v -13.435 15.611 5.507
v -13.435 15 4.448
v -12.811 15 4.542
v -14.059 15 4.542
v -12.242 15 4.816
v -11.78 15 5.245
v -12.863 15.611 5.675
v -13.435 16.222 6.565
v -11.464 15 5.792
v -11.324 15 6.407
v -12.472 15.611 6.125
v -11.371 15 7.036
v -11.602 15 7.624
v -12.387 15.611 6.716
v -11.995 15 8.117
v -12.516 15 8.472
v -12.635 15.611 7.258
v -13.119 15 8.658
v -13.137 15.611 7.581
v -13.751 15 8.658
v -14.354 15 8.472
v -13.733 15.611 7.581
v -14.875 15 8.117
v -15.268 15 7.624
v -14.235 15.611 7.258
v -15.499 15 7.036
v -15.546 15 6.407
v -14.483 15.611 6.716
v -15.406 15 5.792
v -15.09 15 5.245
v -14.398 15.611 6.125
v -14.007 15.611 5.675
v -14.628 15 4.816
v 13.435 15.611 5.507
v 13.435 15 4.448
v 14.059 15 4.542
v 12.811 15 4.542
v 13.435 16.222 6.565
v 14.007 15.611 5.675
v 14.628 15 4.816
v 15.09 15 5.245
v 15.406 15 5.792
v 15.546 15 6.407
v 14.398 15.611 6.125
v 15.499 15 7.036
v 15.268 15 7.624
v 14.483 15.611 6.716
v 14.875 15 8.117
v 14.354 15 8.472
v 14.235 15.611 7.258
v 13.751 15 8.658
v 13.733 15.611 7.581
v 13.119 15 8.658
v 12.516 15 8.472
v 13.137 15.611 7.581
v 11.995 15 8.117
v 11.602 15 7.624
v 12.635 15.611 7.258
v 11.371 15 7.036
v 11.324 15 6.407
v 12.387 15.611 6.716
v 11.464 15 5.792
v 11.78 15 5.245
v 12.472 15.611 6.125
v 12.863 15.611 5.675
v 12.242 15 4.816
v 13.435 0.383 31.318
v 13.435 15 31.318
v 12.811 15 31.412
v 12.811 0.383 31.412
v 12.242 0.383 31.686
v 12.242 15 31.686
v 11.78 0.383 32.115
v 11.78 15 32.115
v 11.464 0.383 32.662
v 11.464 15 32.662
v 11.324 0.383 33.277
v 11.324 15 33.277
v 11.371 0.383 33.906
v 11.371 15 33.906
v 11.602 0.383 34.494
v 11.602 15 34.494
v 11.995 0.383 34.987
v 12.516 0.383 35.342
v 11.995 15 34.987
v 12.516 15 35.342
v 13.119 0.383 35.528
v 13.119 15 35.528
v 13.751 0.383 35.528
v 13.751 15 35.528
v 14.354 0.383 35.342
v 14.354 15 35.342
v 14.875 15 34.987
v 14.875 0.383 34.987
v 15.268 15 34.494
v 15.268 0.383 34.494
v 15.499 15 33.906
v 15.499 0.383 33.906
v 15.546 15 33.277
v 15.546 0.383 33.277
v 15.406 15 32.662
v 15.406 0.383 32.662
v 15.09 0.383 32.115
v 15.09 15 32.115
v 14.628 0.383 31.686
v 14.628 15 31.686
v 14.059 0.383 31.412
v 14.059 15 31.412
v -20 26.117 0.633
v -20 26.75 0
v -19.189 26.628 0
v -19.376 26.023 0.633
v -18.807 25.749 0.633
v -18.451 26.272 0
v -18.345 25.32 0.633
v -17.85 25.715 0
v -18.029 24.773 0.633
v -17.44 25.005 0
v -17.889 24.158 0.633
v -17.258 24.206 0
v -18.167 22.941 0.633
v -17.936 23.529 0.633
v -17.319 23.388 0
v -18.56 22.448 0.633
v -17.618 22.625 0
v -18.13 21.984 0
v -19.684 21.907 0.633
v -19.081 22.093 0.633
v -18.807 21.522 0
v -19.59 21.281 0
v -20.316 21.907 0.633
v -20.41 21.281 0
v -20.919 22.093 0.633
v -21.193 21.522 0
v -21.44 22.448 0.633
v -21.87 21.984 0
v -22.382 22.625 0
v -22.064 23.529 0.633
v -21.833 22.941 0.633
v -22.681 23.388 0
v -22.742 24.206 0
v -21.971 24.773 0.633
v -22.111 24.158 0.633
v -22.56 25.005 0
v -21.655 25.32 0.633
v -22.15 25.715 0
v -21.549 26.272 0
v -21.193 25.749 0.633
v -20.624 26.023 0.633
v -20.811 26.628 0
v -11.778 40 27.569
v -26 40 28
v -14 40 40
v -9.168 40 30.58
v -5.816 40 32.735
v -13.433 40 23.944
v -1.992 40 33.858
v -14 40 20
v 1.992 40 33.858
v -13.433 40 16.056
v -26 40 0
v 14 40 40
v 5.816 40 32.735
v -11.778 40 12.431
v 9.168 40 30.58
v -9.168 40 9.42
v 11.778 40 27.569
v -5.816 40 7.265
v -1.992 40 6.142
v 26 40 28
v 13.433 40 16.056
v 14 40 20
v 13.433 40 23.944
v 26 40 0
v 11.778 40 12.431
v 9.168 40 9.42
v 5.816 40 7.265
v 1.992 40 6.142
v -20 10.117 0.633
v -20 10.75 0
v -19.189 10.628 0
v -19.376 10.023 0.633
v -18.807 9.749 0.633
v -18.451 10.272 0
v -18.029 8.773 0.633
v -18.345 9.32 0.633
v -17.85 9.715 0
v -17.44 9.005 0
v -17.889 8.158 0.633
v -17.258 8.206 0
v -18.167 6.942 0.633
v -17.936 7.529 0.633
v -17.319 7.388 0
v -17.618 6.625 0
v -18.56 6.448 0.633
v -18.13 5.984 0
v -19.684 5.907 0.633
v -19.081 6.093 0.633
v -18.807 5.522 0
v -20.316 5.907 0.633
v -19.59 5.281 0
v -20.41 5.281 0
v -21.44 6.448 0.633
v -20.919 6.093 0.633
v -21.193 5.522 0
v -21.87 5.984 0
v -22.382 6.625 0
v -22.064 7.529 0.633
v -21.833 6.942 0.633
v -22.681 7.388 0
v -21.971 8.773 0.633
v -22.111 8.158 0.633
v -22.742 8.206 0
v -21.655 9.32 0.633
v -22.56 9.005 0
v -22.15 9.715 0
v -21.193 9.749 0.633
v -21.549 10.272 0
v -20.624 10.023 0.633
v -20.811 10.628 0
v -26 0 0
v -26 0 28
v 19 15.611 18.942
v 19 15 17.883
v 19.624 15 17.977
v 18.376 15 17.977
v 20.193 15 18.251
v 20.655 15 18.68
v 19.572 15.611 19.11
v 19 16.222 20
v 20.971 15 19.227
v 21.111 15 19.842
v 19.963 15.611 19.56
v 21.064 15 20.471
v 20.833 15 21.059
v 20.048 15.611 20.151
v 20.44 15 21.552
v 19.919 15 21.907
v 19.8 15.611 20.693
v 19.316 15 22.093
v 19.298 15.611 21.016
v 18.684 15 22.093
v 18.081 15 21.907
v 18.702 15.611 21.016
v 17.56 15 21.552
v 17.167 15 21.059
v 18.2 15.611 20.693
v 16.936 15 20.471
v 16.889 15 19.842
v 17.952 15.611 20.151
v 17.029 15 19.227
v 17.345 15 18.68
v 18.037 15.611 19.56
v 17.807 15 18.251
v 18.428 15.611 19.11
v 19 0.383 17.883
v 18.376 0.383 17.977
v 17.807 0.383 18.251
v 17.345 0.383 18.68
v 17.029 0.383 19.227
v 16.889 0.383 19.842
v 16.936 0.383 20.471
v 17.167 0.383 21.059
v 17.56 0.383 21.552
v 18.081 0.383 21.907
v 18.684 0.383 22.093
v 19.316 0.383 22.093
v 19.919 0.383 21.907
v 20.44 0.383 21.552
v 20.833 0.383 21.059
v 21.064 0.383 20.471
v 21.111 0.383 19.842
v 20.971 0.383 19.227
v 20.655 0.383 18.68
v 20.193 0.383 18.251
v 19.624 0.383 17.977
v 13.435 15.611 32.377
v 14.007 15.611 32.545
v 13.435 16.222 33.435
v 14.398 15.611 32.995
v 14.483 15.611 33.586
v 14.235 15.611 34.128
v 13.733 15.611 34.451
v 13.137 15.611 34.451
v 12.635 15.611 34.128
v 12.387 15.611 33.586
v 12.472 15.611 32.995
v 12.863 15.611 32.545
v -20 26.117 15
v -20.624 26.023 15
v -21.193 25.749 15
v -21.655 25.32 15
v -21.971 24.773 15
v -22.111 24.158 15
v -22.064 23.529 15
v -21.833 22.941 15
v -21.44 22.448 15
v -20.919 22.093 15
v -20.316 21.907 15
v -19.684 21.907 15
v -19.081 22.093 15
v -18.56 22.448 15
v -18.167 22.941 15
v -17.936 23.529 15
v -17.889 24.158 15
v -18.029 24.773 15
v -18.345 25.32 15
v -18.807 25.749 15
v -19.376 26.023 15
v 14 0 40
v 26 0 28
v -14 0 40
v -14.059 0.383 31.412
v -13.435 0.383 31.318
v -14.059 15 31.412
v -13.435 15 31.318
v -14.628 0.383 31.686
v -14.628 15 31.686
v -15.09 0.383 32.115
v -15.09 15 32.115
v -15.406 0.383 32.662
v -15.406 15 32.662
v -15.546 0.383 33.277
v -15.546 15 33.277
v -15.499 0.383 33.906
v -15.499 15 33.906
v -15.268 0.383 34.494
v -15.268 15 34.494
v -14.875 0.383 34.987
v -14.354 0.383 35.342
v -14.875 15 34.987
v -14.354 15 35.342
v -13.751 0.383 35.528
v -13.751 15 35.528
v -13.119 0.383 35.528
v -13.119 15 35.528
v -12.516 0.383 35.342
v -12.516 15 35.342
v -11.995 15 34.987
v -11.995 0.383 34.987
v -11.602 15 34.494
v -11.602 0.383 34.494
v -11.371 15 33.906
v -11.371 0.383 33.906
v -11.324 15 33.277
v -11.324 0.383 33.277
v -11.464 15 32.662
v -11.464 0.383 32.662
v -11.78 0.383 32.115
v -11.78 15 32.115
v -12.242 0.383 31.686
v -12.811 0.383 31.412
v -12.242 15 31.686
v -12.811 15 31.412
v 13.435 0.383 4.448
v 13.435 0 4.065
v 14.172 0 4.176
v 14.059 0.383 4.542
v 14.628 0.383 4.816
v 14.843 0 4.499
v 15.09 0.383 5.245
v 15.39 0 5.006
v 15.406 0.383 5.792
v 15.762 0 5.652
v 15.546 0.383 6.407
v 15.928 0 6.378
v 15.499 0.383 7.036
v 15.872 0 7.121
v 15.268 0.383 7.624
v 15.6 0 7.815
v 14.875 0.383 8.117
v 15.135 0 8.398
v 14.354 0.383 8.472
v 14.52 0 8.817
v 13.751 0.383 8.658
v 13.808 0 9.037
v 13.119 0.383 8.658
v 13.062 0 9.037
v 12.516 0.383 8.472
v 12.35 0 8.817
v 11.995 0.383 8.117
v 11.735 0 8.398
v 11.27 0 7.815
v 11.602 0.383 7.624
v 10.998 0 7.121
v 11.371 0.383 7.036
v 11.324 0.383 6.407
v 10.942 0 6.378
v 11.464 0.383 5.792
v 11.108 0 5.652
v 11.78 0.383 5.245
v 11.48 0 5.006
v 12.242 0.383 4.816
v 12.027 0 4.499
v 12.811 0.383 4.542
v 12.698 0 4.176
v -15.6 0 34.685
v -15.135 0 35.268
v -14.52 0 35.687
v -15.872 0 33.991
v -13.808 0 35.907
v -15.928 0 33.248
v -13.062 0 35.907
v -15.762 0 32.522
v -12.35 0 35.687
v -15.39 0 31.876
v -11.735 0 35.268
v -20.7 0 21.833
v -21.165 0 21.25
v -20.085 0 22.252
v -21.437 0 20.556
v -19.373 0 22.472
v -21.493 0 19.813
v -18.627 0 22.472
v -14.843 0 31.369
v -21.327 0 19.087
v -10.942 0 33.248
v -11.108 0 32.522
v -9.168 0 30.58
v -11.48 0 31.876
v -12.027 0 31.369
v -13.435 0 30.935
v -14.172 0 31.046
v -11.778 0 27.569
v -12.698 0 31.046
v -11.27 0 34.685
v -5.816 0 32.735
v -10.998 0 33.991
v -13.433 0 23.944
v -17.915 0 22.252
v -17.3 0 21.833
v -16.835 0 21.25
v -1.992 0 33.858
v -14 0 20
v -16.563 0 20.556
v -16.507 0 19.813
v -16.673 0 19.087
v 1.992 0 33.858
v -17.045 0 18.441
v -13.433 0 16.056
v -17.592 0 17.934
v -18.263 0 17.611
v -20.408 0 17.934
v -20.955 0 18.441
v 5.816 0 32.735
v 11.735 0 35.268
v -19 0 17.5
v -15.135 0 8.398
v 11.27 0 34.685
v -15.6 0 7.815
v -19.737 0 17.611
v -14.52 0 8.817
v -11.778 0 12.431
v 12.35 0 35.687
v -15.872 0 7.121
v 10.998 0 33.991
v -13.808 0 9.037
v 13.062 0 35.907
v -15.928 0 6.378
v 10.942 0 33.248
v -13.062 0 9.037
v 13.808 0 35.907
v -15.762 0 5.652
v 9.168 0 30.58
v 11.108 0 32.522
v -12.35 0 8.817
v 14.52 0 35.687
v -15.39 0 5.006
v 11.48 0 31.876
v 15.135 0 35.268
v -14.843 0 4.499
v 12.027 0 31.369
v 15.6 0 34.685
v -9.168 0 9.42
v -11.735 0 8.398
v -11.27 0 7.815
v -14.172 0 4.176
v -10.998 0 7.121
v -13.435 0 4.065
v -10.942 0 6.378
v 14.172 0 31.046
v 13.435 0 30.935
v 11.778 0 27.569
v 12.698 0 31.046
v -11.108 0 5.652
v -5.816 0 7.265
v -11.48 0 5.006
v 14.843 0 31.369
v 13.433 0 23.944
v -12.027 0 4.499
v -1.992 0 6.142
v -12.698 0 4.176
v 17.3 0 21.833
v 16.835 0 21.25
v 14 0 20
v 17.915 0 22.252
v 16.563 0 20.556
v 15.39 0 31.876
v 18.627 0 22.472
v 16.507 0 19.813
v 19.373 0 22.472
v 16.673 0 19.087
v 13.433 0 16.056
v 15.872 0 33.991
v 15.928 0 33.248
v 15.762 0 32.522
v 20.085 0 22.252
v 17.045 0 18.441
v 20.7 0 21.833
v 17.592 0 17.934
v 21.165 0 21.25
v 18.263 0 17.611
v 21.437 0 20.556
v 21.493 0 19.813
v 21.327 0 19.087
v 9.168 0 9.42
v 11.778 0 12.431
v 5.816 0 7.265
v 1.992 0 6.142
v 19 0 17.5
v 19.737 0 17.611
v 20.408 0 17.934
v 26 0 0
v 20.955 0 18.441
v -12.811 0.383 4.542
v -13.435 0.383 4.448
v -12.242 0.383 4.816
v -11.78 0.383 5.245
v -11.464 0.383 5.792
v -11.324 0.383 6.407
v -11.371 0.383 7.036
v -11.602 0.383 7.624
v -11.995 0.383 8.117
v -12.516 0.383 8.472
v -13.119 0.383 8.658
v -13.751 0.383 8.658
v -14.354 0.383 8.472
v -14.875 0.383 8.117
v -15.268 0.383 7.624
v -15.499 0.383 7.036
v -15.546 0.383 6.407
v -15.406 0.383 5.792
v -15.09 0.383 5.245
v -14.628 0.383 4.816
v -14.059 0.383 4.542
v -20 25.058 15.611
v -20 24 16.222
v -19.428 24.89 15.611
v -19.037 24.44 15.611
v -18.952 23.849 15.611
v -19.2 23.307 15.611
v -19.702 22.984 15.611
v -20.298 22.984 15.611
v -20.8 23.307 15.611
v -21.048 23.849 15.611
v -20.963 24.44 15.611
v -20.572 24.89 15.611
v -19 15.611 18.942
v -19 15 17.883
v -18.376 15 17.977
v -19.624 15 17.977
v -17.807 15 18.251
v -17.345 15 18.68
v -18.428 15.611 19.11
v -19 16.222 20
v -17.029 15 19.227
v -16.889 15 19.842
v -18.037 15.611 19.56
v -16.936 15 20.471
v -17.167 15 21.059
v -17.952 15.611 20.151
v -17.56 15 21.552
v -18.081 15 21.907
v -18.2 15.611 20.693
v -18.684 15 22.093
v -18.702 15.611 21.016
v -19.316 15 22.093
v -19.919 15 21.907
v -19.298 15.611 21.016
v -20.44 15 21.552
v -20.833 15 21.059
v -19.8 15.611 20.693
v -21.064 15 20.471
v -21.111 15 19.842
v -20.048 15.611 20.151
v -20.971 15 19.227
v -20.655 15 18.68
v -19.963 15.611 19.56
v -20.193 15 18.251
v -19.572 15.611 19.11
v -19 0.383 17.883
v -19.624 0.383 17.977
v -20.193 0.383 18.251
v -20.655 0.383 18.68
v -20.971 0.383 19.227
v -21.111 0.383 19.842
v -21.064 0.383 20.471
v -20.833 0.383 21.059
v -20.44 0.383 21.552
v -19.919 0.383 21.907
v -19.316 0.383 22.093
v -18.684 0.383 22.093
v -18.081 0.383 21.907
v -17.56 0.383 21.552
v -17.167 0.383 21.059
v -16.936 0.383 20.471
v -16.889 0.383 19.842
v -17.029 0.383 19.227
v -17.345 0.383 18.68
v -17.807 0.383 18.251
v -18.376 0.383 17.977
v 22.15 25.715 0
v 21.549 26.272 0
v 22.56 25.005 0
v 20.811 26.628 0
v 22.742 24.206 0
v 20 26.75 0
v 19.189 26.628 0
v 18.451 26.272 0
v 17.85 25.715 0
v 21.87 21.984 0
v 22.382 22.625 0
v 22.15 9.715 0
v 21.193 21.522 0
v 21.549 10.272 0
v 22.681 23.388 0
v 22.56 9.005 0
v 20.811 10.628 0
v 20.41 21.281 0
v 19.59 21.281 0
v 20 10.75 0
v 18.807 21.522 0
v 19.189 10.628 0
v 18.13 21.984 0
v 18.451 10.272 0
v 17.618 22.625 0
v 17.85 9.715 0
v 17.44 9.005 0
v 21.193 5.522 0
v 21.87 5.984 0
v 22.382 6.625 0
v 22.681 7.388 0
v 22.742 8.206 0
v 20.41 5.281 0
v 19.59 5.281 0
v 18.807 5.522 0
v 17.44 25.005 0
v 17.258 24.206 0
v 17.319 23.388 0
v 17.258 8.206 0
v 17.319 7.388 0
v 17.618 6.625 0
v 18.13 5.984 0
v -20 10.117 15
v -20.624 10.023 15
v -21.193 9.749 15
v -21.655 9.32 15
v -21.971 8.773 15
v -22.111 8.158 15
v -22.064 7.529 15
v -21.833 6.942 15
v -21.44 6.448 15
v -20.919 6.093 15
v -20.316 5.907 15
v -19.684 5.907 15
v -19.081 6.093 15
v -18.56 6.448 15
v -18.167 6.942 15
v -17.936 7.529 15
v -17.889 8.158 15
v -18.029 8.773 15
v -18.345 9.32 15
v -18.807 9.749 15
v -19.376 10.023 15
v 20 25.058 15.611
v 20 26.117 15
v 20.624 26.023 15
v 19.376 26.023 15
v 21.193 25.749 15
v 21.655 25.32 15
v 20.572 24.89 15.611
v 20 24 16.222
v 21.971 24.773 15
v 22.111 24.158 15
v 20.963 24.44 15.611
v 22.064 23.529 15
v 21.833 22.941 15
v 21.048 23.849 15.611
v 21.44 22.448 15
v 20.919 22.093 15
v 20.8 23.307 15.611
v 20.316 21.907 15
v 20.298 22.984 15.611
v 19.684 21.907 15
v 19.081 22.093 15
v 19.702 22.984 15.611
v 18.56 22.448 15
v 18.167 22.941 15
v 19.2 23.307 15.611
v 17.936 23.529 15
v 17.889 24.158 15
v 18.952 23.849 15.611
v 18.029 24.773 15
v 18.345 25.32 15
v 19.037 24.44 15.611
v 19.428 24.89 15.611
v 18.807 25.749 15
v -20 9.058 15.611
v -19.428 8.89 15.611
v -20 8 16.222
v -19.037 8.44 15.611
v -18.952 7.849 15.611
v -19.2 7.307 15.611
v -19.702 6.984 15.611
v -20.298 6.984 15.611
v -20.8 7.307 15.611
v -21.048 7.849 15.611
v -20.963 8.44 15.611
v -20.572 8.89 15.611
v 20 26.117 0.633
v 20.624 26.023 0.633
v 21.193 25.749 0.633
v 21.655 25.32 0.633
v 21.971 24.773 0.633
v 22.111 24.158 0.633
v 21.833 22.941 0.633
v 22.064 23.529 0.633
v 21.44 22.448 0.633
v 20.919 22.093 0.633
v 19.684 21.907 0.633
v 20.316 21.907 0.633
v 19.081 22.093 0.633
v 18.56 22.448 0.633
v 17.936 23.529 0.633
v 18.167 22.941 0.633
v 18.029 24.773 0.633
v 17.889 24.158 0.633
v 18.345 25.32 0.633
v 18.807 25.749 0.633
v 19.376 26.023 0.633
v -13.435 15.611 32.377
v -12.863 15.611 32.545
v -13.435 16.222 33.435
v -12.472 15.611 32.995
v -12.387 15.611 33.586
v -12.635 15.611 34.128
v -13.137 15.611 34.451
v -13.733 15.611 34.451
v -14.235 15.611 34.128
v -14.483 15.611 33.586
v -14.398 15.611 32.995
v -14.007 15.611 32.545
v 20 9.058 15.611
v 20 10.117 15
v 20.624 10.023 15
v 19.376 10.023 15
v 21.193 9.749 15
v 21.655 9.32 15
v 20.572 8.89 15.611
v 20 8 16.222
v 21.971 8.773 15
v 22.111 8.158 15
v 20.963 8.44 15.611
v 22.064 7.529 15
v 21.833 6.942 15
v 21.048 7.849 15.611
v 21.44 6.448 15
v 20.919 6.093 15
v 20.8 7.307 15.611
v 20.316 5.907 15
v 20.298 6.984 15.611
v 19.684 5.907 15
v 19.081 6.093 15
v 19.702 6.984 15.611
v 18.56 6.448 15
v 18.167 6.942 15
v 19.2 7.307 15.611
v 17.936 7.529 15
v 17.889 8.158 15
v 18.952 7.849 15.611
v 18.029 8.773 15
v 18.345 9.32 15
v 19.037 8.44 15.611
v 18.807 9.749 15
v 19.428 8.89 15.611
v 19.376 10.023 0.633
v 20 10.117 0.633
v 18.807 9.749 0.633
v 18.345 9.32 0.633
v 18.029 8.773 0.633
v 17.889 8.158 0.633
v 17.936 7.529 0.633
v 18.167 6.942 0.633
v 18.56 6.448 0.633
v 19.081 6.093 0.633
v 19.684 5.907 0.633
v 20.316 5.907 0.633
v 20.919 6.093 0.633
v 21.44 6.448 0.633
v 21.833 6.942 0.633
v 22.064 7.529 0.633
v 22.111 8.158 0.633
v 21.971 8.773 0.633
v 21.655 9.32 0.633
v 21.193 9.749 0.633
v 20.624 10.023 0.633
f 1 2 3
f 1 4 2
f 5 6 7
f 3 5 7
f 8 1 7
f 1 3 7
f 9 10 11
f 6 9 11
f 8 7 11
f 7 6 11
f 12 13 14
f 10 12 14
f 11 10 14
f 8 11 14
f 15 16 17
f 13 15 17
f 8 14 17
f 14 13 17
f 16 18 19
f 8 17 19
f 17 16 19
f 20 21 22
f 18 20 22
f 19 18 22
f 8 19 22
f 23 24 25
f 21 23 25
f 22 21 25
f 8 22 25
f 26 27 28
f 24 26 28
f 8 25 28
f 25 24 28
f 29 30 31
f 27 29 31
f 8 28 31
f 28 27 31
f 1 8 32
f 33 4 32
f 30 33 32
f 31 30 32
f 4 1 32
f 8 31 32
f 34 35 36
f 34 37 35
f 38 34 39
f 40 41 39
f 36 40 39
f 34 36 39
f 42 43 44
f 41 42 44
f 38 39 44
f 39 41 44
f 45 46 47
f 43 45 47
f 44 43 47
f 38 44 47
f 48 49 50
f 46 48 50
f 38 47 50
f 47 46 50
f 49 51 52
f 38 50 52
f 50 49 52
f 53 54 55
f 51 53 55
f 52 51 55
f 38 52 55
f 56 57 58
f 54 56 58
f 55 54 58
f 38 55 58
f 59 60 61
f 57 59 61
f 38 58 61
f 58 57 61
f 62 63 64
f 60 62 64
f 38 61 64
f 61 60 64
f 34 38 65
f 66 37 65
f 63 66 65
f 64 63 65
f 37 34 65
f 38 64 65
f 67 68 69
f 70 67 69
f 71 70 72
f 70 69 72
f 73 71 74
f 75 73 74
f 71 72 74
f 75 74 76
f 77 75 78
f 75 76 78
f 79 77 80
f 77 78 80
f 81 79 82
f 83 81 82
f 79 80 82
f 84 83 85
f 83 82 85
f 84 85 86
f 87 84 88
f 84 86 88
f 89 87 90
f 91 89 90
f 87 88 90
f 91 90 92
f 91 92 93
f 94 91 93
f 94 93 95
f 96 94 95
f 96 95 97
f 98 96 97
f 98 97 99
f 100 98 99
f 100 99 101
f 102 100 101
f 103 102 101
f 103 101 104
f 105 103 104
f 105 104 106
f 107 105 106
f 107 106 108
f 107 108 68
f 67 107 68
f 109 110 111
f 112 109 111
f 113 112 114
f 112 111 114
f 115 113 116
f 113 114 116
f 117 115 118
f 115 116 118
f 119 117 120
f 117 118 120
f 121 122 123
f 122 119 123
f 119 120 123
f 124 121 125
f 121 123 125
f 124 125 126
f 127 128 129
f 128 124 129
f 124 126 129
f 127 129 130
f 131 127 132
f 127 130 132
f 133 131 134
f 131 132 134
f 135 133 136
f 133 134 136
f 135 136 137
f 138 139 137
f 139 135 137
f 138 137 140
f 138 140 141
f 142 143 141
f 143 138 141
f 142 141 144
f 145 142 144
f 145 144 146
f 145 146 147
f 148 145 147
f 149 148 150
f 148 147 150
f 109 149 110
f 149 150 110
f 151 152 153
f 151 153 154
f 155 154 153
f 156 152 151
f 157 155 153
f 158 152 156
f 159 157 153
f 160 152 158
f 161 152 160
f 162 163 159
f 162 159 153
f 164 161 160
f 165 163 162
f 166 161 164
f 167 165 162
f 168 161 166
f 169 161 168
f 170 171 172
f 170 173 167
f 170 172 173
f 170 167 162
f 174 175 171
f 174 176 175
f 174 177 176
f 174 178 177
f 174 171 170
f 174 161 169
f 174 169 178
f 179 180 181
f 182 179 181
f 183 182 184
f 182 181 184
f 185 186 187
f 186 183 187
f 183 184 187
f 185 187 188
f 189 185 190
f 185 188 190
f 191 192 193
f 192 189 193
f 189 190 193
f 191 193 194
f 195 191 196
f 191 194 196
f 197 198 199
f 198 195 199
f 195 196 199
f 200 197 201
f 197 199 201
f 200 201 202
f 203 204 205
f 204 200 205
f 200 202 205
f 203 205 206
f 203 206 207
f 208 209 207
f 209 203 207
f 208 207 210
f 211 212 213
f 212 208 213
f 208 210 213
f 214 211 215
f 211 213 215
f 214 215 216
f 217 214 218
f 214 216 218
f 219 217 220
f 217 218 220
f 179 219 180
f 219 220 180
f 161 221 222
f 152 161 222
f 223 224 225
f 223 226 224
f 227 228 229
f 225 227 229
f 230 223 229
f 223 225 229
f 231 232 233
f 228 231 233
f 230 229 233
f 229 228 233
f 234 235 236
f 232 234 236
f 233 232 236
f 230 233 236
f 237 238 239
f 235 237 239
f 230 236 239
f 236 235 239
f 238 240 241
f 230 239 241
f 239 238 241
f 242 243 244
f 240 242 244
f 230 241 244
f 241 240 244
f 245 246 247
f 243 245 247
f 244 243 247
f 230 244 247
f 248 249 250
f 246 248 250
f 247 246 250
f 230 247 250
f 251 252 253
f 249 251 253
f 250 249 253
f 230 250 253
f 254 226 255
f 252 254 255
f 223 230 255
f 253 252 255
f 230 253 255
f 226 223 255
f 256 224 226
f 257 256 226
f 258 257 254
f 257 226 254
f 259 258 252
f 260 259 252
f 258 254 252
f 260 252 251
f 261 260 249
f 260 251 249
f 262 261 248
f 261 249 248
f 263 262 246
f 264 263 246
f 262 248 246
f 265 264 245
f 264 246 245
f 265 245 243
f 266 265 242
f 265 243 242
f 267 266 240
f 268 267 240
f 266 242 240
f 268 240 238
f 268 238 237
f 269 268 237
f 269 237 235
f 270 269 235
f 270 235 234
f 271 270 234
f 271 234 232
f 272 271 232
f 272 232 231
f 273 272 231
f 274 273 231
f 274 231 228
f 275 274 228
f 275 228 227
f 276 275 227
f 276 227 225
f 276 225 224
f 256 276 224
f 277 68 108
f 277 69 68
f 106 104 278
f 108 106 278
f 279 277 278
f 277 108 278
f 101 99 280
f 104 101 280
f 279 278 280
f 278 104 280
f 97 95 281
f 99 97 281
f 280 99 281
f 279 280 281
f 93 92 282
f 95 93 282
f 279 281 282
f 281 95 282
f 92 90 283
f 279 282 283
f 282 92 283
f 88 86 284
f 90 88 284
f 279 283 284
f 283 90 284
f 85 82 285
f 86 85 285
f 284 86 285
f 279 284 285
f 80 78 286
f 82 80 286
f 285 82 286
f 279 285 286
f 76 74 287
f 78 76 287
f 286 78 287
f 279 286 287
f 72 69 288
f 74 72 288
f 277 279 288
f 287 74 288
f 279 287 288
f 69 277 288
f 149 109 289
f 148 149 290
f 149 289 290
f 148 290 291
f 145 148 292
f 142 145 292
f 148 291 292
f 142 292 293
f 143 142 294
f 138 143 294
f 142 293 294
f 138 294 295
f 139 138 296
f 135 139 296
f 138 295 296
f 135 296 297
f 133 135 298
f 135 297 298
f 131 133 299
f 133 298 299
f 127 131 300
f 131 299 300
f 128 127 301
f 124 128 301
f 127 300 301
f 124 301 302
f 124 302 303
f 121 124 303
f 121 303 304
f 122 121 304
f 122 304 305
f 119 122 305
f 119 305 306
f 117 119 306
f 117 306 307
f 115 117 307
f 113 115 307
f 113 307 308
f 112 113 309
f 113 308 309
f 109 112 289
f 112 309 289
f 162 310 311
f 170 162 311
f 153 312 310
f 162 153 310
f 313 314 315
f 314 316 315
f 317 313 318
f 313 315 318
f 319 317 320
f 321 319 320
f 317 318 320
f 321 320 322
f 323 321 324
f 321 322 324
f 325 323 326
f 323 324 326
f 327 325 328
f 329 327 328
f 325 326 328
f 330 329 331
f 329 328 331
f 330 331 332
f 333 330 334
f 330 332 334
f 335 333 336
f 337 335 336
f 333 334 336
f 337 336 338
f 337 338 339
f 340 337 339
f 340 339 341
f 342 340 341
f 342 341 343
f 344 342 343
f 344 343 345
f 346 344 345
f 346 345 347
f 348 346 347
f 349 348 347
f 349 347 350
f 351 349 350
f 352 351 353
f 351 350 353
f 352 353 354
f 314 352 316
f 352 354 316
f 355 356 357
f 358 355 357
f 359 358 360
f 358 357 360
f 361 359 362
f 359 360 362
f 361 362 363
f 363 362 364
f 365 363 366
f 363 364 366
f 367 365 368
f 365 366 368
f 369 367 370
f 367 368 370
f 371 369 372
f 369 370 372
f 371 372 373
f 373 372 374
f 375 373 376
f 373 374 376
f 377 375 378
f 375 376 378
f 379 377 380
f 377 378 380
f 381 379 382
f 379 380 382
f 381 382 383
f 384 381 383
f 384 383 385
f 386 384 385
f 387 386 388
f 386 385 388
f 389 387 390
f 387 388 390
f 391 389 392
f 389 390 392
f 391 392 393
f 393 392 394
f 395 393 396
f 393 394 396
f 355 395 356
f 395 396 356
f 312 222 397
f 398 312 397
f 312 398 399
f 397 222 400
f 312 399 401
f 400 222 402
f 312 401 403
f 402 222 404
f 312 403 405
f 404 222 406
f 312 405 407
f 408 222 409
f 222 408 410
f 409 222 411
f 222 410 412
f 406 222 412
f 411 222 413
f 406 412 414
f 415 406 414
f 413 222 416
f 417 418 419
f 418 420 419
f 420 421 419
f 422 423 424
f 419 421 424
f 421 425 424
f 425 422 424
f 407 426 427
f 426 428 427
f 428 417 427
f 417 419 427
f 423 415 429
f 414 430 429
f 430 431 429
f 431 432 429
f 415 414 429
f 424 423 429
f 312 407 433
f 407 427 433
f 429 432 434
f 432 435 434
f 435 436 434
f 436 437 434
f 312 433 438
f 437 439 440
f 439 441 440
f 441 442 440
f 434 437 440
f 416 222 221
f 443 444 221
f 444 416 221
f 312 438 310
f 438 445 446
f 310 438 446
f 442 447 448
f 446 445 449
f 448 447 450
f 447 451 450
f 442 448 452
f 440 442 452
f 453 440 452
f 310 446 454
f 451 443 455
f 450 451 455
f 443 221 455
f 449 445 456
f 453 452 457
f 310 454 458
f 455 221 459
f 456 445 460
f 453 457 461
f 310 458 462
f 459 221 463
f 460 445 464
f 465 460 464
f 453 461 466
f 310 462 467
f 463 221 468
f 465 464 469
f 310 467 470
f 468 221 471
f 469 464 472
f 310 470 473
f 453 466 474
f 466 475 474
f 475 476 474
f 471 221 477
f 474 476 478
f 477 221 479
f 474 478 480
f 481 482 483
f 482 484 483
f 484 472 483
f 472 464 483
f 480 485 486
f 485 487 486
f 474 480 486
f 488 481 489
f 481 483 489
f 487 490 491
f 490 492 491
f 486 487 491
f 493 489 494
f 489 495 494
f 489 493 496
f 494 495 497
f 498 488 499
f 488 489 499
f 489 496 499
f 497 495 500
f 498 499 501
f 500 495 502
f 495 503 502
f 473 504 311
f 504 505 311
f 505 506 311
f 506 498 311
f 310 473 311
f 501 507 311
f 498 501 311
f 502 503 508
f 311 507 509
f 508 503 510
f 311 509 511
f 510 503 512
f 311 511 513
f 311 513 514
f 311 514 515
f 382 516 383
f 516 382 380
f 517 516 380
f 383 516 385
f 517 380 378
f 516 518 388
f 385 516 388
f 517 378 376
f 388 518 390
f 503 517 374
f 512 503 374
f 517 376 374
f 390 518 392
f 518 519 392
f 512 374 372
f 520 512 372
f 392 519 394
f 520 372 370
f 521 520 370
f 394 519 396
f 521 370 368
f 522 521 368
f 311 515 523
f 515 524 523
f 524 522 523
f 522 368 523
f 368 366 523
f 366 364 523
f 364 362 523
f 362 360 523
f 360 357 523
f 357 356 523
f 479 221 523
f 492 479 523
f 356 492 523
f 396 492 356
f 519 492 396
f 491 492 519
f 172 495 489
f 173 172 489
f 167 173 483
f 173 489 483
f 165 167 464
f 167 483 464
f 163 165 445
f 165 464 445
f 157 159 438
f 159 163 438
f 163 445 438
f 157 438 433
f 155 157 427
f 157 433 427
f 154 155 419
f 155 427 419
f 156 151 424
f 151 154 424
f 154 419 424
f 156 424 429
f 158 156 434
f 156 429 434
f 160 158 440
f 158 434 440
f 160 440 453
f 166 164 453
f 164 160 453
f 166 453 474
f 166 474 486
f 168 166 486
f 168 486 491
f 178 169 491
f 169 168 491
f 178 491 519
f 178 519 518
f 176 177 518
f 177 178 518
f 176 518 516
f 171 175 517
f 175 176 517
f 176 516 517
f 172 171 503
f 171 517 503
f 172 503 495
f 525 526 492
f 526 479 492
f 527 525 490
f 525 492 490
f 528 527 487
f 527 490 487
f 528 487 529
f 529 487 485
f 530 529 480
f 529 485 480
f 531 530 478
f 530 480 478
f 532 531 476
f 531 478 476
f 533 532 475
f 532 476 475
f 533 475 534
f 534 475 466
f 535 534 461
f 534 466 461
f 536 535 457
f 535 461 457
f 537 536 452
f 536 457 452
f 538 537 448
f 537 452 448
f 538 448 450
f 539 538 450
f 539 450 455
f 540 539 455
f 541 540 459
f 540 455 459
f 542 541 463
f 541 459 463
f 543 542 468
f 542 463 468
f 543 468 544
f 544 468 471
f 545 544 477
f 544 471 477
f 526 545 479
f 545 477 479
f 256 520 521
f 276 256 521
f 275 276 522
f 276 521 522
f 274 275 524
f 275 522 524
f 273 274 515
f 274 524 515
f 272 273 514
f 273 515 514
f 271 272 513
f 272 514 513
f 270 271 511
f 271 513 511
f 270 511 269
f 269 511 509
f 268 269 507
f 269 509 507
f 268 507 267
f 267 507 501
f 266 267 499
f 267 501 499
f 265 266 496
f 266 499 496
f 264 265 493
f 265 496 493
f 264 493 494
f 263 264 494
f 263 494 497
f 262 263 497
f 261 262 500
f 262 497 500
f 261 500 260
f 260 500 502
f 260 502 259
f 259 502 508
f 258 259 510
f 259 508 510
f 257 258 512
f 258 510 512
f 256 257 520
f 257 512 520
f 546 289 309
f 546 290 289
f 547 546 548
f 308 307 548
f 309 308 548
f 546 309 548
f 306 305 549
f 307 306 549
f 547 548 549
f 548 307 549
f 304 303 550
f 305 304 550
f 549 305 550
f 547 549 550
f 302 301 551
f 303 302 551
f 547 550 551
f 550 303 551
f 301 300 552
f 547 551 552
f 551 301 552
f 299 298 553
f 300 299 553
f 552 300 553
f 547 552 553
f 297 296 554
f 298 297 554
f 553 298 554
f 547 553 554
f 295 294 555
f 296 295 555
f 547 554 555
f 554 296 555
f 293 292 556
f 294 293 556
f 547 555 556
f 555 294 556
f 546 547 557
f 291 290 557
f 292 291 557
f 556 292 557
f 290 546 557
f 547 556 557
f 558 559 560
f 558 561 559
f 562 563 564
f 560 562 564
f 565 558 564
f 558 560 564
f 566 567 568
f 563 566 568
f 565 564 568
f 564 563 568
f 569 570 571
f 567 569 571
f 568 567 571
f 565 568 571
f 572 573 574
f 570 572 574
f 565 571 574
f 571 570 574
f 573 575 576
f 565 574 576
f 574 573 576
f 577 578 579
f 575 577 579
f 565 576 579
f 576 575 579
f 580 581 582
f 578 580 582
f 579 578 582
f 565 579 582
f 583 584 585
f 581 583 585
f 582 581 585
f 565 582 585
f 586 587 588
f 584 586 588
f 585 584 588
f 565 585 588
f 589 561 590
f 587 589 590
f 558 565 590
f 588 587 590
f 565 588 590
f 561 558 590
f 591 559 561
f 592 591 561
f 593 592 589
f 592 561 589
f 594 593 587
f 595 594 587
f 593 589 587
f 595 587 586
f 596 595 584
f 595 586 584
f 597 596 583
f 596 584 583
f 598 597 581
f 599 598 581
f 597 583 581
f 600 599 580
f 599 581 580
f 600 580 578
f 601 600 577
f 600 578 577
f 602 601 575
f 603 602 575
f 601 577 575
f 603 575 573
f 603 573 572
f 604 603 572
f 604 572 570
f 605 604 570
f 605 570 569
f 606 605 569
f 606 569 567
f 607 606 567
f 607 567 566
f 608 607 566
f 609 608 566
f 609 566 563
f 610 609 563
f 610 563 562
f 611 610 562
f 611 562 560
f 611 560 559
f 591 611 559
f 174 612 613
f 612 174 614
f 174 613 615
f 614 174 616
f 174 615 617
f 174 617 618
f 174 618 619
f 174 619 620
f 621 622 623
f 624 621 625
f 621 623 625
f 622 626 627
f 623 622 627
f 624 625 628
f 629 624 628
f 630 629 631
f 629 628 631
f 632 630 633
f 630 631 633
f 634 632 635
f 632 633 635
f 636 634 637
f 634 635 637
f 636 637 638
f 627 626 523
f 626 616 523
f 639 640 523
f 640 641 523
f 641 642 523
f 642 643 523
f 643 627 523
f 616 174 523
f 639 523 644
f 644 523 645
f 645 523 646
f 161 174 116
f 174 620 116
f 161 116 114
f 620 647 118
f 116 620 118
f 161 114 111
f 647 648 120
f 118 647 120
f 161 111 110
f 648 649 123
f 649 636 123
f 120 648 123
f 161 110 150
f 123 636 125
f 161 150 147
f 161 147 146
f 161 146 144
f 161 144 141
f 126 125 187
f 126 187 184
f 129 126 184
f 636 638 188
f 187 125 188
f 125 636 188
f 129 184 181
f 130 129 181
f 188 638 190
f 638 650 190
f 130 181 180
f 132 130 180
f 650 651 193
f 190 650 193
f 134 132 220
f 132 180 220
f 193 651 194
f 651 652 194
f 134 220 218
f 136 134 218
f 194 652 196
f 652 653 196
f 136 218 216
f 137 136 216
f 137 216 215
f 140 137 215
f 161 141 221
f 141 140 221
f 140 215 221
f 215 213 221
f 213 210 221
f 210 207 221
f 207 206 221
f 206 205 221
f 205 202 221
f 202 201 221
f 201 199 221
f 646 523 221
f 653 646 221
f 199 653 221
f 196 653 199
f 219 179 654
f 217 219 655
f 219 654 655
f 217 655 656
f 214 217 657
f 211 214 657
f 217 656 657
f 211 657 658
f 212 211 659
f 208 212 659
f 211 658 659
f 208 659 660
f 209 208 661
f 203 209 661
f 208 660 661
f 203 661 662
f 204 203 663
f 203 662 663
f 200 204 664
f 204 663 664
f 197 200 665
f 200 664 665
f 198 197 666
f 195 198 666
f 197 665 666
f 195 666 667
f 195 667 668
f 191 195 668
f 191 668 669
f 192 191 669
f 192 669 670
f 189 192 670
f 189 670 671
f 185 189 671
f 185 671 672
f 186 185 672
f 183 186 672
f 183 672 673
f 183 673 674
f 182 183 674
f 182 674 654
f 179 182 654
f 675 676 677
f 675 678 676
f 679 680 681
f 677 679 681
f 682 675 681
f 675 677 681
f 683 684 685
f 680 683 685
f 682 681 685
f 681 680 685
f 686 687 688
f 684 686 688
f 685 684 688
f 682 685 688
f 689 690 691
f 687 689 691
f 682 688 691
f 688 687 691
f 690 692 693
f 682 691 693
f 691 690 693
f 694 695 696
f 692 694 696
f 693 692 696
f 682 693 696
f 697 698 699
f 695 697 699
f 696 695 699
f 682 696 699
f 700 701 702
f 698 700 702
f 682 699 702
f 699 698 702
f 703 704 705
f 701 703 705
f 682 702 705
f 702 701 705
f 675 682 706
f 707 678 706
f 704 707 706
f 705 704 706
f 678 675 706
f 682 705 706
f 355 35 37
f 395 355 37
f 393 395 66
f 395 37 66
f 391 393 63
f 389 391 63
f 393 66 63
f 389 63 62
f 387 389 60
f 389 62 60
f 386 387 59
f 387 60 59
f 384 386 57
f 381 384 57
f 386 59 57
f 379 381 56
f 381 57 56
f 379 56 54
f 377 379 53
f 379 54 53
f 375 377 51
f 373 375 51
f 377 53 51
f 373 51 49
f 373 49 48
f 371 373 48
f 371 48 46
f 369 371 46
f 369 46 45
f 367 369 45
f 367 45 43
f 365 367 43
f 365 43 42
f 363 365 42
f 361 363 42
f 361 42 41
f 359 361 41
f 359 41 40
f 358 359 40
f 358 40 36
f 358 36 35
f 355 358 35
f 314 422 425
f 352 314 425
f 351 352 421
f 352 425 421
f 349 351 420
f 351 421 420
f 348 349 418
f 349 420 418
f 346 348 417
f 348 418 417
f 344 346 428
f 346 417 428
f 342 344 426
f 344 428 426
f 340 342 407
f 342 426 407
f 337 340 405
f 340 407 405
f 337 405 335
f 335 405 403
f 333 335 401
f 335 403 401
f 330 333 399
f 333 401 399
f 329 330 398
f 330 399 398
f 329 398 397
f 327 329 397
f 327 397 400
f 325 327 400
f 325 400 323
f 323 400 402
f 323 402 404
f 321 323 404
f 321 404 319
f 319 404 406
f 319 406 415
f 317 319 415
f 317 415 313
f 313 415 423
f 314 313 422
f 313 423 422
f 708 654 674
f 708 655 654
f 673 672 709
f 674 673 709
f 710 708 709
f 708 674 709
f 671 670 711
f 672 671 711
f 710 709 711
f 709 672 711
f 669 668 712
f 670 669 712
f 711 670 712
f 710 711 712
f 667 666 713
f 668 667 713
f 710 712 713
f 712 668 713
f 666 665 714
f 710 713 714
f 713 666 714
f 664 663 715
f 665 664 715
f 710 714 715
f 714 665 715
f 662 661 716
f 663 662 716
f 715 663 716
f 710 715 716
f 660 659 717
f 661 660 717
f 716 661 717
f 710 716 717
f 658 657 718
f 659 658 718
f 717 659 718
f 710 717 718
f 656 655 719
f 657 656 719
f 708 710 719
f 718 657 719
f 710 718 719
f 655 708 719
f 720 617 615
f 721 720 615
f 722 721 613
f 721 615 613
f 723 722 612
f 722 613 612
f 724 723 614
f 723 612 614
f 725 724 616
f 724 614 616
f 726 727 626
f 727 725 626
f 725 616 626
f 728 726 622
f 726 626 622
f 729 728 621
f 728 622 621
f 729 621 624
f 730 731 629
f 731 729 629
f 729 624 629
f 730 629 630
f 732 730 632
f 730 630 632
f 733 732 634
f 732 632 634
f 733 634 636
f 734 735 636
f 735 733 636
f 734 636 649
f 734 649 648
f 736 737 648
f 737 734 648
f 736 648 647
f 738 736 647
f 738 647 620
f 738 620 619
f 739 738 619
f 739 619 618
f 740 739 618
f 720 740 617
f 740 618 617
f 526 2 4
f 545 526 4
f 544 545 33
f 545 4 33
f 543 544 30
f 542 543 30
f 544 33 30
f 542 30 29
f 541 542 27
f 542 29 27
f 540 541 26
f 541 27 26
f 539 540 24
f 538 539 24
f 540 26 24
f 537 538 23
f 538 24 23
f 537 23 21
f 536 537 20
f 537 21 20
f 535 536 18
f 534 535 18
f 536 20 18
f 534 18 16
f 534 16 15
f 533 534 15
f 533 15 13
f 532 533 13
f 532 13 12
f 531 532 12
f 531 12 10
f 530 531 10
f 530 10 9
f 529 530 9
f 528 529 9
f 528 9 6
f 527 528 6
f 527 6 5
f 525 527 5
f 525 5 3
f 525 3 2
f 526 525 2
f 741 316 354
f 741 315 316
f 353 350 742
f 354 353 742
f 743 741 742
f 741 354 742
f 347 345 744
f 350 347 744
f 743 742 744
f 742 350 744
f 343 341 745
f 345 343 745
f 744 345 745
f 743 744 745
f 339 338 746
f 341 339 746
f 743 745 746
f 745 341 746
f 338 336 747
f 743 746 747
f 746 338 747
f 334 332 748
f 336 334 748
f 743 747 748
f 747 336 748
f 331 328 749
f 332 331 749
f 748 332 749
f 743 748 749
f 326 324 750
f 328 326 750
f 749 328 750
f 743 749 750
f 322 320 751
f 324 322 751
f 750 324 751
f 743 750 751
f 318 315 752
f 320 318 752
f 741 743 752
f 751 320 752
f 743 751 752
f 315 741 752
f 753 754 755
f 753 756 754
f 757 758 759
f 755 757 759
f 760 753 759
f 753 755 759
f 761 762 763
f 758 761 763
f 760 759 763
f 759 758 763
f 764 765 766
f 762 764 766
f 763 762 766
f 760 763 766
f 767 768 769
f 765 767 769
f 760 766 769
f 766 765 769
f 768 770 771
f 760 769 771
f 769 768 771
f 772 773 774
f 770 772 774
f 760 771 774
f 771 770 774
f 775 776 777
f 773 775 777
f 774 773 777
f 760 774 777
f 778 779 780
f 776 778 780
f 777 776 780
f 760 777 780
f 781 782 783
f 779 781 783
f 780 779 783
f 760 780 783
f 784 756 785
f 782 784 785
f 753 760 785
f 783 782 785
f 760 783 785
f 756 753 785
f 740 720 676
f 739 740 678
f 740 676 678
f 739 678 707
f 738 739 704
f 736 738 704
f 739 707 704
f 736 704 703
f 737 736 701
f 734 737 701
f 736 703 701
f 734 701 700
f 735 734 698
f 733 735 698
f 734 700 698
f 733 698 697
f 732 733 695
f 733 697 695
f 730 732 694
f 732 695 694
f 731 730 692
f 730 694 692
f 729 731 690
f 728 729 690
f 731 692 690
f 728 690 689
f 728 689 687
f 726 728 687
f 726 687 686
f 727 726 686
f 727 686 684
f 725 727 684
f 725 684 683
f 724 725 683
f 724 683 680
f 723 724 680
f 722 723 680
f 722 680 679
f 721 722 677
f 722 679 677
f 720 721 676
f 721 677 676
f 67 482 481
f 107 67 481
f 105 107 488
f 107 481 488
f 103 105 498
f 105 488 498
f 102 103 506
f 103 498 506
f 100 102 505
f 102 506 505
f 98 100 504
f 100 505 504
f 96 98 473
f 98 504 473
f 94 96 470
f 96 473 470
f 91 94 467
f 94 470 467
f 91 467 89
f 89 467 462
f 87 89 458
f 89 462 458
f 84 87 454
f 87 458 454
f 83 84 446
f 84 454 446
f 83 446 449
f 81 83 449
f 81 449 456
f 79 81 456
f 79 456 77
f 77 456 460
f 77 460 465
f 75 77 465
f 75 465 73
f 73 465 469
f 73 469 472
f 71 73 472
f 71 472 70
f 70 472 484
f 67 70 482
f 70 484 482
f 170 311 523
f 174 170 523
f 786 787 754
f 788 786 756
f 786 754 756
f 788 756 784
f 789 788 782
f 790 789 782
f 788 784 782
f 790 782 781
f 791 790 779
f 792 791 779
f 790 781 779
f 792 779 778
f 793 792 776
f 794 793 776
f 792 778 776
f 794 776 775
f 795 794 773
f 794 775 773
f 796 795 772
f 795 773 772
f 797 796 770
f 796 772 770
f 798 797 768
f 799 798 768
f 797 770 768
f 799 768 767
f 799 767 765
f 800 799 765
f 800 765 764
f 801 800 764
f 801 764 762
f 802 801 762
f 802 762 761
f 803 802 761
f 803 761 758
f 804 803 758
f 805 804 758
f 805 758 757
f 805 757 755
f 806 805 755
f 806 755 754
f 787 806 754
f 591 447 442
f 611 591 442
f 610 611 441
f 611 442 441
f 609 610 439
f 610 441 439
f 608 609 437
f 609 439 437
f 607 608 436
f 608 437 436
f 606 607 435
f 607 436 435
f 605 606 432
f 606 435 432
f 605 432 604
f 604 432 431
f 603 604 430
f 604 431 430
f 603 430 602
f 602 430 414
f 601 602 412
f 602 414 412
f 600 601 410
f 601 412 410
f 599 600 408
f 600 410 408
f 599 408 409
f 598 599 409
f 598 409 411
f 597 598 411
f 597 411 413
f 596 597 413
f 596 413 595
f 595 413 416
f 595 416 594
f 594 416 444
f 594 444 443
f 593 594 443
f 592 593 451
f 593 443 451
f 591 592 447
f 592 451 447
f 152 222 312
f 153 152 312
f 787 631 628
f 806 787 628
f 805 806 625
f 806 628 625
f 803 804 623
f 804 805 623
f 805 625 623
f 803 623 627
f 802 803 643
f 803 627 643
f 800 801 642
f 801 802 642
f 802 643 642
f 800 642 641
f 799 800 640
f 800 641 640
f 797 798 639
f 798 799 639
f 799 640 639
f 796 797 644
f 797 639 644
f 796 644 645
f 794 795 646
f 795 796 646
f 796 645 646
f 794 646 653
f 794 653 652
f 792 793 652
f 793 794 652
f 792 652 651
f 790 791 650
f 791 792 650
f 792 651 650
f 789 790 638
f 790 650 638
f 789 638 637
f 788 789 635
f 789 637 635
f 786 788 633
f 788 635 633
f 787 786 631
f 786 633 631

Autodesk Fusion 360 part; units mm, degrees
sketch "Sketch1" plane through (0, 0, 0) normal (0, 1, 0) x (1, 0, 0)
  line L0 (26, 0) -> (-26, 0)
  line L1 (0, 0) -> (0, -40) construction
  circle A0 centre (0, -20) radius 14
  circle A1 centre (0, -20) radius 19 construction
  line L2 (-26, 0) -> (-26, -28)
  line L3 (-26, -28) -> (-14, -40)
  line L4 (-14, -40) -> (14, -40)
  line L5 (14, -40) -> (26, -28)
  line L6 (26, -28) -> (26, 0)
  line L7 (26, -20) -> (-26, -20) construction
  line L8 (0, -20) -> (13.435, -33.435) construction
  line L9 (0, -20) -> (19, -20) construction
  line L10 (0, -20) -> (13.435, -6.565) construction
  line L11 (0, -20) -> (19, -20) construction
  line L12 (0, -20) -> (-13.435, -33.435) construction
  line L13 (0, -20) -> (19, -20) construction
  line L14 (0, -20) -> (-13.435, -6.565) construction
  line L15 (0, -20) -> (19, -20) construction
  circle A2 centre (-13.435, -33.435) radius 2.5
  circle A3 centre (-19, -20) radius 2.5
  circle A4 centre (-13.435, -6.565) radius 2.5
  circle A5 centre (13.435, -33.435) radius 2.5
  circle A6 centre (13.435, -6.565) radius 2.5
  circle A7 centre (19, -20) radius 2.5
  point P0 (0, -20)
  dimension "d2" = 52
  dimension "d3" = 40
  dimension "d4" = 28
  dimension "d5" = 38
  dimension "d6" = 135
  dimension "d8" = 135
  dimension "d10" = 12
  dimension "d12" = 45
  dimension "d13" = 45
  dimension "d16" = 45
  dimension "d17" = 45
  dimension "d18" = 5
  dimension "d19" = 5
  dimension "d20" = 5
  dimension "d21" = 5
  dimension "d23" = 5
  dimension "d27" = 5
  dimension "d28" = 19
extrude "Extrude1" add sketch "Sketch1" along normal blind 40 contours L0 L2 L3 L4 L5 L6 | A2 | A3 | A4 | A5 | A6 | A7
hole "Hole1" at (-19, 0, 20) at (-13.435, 0, 33.435) at (13.435, 0, 33.435) at (19, 0, 20) at (13.435, 0, 6.565) at (-13.435, 0, 6.565) direction (0, 1, 0) diameter 4.234 depth 15 tip angle 120 countersink diameter 5 countersink angle 90
sketch "Sketch2" plane through (0, 0, 0) normal (0, 0, -1) x (1, 0, 0)
  line L0 (26, 0) -> (-26, 0)
  line L1 (-26, 0) -> (-26, -40)
  line L2 (-26, -40) -> (26, -40)
  line L3 (26, -40) -> (26, 0)
  line L4 (-20, 0) -> (-20, -40) construction
  line L5 (0, 0) -> (0, -40) construction
  circle A0 centre (-20, -8) radius 2.5
  circle A1 centre (-20, -24) radius 2.5
  line L6 (-20, -20) -> (0, -20) construction
  circle A2 centre (20, -8) radius 2.5
  circle A3 centre (20, -24) radius 2.5
  dimension "d37" = 5
  dimension "d38" = 5
  dimension "d41" = 8
  dimension "d42" = 20
  dimension "d43" = 24
hole "Hole2" at (-20, 8, 0) at (-20, 24, 0) at (20, 8, 0) at (20, 24, 0) direction (0, 0, 1) diameter 4.234 depth 15 tip angle 120 countersink diameter 5.5 countersink angle 90
